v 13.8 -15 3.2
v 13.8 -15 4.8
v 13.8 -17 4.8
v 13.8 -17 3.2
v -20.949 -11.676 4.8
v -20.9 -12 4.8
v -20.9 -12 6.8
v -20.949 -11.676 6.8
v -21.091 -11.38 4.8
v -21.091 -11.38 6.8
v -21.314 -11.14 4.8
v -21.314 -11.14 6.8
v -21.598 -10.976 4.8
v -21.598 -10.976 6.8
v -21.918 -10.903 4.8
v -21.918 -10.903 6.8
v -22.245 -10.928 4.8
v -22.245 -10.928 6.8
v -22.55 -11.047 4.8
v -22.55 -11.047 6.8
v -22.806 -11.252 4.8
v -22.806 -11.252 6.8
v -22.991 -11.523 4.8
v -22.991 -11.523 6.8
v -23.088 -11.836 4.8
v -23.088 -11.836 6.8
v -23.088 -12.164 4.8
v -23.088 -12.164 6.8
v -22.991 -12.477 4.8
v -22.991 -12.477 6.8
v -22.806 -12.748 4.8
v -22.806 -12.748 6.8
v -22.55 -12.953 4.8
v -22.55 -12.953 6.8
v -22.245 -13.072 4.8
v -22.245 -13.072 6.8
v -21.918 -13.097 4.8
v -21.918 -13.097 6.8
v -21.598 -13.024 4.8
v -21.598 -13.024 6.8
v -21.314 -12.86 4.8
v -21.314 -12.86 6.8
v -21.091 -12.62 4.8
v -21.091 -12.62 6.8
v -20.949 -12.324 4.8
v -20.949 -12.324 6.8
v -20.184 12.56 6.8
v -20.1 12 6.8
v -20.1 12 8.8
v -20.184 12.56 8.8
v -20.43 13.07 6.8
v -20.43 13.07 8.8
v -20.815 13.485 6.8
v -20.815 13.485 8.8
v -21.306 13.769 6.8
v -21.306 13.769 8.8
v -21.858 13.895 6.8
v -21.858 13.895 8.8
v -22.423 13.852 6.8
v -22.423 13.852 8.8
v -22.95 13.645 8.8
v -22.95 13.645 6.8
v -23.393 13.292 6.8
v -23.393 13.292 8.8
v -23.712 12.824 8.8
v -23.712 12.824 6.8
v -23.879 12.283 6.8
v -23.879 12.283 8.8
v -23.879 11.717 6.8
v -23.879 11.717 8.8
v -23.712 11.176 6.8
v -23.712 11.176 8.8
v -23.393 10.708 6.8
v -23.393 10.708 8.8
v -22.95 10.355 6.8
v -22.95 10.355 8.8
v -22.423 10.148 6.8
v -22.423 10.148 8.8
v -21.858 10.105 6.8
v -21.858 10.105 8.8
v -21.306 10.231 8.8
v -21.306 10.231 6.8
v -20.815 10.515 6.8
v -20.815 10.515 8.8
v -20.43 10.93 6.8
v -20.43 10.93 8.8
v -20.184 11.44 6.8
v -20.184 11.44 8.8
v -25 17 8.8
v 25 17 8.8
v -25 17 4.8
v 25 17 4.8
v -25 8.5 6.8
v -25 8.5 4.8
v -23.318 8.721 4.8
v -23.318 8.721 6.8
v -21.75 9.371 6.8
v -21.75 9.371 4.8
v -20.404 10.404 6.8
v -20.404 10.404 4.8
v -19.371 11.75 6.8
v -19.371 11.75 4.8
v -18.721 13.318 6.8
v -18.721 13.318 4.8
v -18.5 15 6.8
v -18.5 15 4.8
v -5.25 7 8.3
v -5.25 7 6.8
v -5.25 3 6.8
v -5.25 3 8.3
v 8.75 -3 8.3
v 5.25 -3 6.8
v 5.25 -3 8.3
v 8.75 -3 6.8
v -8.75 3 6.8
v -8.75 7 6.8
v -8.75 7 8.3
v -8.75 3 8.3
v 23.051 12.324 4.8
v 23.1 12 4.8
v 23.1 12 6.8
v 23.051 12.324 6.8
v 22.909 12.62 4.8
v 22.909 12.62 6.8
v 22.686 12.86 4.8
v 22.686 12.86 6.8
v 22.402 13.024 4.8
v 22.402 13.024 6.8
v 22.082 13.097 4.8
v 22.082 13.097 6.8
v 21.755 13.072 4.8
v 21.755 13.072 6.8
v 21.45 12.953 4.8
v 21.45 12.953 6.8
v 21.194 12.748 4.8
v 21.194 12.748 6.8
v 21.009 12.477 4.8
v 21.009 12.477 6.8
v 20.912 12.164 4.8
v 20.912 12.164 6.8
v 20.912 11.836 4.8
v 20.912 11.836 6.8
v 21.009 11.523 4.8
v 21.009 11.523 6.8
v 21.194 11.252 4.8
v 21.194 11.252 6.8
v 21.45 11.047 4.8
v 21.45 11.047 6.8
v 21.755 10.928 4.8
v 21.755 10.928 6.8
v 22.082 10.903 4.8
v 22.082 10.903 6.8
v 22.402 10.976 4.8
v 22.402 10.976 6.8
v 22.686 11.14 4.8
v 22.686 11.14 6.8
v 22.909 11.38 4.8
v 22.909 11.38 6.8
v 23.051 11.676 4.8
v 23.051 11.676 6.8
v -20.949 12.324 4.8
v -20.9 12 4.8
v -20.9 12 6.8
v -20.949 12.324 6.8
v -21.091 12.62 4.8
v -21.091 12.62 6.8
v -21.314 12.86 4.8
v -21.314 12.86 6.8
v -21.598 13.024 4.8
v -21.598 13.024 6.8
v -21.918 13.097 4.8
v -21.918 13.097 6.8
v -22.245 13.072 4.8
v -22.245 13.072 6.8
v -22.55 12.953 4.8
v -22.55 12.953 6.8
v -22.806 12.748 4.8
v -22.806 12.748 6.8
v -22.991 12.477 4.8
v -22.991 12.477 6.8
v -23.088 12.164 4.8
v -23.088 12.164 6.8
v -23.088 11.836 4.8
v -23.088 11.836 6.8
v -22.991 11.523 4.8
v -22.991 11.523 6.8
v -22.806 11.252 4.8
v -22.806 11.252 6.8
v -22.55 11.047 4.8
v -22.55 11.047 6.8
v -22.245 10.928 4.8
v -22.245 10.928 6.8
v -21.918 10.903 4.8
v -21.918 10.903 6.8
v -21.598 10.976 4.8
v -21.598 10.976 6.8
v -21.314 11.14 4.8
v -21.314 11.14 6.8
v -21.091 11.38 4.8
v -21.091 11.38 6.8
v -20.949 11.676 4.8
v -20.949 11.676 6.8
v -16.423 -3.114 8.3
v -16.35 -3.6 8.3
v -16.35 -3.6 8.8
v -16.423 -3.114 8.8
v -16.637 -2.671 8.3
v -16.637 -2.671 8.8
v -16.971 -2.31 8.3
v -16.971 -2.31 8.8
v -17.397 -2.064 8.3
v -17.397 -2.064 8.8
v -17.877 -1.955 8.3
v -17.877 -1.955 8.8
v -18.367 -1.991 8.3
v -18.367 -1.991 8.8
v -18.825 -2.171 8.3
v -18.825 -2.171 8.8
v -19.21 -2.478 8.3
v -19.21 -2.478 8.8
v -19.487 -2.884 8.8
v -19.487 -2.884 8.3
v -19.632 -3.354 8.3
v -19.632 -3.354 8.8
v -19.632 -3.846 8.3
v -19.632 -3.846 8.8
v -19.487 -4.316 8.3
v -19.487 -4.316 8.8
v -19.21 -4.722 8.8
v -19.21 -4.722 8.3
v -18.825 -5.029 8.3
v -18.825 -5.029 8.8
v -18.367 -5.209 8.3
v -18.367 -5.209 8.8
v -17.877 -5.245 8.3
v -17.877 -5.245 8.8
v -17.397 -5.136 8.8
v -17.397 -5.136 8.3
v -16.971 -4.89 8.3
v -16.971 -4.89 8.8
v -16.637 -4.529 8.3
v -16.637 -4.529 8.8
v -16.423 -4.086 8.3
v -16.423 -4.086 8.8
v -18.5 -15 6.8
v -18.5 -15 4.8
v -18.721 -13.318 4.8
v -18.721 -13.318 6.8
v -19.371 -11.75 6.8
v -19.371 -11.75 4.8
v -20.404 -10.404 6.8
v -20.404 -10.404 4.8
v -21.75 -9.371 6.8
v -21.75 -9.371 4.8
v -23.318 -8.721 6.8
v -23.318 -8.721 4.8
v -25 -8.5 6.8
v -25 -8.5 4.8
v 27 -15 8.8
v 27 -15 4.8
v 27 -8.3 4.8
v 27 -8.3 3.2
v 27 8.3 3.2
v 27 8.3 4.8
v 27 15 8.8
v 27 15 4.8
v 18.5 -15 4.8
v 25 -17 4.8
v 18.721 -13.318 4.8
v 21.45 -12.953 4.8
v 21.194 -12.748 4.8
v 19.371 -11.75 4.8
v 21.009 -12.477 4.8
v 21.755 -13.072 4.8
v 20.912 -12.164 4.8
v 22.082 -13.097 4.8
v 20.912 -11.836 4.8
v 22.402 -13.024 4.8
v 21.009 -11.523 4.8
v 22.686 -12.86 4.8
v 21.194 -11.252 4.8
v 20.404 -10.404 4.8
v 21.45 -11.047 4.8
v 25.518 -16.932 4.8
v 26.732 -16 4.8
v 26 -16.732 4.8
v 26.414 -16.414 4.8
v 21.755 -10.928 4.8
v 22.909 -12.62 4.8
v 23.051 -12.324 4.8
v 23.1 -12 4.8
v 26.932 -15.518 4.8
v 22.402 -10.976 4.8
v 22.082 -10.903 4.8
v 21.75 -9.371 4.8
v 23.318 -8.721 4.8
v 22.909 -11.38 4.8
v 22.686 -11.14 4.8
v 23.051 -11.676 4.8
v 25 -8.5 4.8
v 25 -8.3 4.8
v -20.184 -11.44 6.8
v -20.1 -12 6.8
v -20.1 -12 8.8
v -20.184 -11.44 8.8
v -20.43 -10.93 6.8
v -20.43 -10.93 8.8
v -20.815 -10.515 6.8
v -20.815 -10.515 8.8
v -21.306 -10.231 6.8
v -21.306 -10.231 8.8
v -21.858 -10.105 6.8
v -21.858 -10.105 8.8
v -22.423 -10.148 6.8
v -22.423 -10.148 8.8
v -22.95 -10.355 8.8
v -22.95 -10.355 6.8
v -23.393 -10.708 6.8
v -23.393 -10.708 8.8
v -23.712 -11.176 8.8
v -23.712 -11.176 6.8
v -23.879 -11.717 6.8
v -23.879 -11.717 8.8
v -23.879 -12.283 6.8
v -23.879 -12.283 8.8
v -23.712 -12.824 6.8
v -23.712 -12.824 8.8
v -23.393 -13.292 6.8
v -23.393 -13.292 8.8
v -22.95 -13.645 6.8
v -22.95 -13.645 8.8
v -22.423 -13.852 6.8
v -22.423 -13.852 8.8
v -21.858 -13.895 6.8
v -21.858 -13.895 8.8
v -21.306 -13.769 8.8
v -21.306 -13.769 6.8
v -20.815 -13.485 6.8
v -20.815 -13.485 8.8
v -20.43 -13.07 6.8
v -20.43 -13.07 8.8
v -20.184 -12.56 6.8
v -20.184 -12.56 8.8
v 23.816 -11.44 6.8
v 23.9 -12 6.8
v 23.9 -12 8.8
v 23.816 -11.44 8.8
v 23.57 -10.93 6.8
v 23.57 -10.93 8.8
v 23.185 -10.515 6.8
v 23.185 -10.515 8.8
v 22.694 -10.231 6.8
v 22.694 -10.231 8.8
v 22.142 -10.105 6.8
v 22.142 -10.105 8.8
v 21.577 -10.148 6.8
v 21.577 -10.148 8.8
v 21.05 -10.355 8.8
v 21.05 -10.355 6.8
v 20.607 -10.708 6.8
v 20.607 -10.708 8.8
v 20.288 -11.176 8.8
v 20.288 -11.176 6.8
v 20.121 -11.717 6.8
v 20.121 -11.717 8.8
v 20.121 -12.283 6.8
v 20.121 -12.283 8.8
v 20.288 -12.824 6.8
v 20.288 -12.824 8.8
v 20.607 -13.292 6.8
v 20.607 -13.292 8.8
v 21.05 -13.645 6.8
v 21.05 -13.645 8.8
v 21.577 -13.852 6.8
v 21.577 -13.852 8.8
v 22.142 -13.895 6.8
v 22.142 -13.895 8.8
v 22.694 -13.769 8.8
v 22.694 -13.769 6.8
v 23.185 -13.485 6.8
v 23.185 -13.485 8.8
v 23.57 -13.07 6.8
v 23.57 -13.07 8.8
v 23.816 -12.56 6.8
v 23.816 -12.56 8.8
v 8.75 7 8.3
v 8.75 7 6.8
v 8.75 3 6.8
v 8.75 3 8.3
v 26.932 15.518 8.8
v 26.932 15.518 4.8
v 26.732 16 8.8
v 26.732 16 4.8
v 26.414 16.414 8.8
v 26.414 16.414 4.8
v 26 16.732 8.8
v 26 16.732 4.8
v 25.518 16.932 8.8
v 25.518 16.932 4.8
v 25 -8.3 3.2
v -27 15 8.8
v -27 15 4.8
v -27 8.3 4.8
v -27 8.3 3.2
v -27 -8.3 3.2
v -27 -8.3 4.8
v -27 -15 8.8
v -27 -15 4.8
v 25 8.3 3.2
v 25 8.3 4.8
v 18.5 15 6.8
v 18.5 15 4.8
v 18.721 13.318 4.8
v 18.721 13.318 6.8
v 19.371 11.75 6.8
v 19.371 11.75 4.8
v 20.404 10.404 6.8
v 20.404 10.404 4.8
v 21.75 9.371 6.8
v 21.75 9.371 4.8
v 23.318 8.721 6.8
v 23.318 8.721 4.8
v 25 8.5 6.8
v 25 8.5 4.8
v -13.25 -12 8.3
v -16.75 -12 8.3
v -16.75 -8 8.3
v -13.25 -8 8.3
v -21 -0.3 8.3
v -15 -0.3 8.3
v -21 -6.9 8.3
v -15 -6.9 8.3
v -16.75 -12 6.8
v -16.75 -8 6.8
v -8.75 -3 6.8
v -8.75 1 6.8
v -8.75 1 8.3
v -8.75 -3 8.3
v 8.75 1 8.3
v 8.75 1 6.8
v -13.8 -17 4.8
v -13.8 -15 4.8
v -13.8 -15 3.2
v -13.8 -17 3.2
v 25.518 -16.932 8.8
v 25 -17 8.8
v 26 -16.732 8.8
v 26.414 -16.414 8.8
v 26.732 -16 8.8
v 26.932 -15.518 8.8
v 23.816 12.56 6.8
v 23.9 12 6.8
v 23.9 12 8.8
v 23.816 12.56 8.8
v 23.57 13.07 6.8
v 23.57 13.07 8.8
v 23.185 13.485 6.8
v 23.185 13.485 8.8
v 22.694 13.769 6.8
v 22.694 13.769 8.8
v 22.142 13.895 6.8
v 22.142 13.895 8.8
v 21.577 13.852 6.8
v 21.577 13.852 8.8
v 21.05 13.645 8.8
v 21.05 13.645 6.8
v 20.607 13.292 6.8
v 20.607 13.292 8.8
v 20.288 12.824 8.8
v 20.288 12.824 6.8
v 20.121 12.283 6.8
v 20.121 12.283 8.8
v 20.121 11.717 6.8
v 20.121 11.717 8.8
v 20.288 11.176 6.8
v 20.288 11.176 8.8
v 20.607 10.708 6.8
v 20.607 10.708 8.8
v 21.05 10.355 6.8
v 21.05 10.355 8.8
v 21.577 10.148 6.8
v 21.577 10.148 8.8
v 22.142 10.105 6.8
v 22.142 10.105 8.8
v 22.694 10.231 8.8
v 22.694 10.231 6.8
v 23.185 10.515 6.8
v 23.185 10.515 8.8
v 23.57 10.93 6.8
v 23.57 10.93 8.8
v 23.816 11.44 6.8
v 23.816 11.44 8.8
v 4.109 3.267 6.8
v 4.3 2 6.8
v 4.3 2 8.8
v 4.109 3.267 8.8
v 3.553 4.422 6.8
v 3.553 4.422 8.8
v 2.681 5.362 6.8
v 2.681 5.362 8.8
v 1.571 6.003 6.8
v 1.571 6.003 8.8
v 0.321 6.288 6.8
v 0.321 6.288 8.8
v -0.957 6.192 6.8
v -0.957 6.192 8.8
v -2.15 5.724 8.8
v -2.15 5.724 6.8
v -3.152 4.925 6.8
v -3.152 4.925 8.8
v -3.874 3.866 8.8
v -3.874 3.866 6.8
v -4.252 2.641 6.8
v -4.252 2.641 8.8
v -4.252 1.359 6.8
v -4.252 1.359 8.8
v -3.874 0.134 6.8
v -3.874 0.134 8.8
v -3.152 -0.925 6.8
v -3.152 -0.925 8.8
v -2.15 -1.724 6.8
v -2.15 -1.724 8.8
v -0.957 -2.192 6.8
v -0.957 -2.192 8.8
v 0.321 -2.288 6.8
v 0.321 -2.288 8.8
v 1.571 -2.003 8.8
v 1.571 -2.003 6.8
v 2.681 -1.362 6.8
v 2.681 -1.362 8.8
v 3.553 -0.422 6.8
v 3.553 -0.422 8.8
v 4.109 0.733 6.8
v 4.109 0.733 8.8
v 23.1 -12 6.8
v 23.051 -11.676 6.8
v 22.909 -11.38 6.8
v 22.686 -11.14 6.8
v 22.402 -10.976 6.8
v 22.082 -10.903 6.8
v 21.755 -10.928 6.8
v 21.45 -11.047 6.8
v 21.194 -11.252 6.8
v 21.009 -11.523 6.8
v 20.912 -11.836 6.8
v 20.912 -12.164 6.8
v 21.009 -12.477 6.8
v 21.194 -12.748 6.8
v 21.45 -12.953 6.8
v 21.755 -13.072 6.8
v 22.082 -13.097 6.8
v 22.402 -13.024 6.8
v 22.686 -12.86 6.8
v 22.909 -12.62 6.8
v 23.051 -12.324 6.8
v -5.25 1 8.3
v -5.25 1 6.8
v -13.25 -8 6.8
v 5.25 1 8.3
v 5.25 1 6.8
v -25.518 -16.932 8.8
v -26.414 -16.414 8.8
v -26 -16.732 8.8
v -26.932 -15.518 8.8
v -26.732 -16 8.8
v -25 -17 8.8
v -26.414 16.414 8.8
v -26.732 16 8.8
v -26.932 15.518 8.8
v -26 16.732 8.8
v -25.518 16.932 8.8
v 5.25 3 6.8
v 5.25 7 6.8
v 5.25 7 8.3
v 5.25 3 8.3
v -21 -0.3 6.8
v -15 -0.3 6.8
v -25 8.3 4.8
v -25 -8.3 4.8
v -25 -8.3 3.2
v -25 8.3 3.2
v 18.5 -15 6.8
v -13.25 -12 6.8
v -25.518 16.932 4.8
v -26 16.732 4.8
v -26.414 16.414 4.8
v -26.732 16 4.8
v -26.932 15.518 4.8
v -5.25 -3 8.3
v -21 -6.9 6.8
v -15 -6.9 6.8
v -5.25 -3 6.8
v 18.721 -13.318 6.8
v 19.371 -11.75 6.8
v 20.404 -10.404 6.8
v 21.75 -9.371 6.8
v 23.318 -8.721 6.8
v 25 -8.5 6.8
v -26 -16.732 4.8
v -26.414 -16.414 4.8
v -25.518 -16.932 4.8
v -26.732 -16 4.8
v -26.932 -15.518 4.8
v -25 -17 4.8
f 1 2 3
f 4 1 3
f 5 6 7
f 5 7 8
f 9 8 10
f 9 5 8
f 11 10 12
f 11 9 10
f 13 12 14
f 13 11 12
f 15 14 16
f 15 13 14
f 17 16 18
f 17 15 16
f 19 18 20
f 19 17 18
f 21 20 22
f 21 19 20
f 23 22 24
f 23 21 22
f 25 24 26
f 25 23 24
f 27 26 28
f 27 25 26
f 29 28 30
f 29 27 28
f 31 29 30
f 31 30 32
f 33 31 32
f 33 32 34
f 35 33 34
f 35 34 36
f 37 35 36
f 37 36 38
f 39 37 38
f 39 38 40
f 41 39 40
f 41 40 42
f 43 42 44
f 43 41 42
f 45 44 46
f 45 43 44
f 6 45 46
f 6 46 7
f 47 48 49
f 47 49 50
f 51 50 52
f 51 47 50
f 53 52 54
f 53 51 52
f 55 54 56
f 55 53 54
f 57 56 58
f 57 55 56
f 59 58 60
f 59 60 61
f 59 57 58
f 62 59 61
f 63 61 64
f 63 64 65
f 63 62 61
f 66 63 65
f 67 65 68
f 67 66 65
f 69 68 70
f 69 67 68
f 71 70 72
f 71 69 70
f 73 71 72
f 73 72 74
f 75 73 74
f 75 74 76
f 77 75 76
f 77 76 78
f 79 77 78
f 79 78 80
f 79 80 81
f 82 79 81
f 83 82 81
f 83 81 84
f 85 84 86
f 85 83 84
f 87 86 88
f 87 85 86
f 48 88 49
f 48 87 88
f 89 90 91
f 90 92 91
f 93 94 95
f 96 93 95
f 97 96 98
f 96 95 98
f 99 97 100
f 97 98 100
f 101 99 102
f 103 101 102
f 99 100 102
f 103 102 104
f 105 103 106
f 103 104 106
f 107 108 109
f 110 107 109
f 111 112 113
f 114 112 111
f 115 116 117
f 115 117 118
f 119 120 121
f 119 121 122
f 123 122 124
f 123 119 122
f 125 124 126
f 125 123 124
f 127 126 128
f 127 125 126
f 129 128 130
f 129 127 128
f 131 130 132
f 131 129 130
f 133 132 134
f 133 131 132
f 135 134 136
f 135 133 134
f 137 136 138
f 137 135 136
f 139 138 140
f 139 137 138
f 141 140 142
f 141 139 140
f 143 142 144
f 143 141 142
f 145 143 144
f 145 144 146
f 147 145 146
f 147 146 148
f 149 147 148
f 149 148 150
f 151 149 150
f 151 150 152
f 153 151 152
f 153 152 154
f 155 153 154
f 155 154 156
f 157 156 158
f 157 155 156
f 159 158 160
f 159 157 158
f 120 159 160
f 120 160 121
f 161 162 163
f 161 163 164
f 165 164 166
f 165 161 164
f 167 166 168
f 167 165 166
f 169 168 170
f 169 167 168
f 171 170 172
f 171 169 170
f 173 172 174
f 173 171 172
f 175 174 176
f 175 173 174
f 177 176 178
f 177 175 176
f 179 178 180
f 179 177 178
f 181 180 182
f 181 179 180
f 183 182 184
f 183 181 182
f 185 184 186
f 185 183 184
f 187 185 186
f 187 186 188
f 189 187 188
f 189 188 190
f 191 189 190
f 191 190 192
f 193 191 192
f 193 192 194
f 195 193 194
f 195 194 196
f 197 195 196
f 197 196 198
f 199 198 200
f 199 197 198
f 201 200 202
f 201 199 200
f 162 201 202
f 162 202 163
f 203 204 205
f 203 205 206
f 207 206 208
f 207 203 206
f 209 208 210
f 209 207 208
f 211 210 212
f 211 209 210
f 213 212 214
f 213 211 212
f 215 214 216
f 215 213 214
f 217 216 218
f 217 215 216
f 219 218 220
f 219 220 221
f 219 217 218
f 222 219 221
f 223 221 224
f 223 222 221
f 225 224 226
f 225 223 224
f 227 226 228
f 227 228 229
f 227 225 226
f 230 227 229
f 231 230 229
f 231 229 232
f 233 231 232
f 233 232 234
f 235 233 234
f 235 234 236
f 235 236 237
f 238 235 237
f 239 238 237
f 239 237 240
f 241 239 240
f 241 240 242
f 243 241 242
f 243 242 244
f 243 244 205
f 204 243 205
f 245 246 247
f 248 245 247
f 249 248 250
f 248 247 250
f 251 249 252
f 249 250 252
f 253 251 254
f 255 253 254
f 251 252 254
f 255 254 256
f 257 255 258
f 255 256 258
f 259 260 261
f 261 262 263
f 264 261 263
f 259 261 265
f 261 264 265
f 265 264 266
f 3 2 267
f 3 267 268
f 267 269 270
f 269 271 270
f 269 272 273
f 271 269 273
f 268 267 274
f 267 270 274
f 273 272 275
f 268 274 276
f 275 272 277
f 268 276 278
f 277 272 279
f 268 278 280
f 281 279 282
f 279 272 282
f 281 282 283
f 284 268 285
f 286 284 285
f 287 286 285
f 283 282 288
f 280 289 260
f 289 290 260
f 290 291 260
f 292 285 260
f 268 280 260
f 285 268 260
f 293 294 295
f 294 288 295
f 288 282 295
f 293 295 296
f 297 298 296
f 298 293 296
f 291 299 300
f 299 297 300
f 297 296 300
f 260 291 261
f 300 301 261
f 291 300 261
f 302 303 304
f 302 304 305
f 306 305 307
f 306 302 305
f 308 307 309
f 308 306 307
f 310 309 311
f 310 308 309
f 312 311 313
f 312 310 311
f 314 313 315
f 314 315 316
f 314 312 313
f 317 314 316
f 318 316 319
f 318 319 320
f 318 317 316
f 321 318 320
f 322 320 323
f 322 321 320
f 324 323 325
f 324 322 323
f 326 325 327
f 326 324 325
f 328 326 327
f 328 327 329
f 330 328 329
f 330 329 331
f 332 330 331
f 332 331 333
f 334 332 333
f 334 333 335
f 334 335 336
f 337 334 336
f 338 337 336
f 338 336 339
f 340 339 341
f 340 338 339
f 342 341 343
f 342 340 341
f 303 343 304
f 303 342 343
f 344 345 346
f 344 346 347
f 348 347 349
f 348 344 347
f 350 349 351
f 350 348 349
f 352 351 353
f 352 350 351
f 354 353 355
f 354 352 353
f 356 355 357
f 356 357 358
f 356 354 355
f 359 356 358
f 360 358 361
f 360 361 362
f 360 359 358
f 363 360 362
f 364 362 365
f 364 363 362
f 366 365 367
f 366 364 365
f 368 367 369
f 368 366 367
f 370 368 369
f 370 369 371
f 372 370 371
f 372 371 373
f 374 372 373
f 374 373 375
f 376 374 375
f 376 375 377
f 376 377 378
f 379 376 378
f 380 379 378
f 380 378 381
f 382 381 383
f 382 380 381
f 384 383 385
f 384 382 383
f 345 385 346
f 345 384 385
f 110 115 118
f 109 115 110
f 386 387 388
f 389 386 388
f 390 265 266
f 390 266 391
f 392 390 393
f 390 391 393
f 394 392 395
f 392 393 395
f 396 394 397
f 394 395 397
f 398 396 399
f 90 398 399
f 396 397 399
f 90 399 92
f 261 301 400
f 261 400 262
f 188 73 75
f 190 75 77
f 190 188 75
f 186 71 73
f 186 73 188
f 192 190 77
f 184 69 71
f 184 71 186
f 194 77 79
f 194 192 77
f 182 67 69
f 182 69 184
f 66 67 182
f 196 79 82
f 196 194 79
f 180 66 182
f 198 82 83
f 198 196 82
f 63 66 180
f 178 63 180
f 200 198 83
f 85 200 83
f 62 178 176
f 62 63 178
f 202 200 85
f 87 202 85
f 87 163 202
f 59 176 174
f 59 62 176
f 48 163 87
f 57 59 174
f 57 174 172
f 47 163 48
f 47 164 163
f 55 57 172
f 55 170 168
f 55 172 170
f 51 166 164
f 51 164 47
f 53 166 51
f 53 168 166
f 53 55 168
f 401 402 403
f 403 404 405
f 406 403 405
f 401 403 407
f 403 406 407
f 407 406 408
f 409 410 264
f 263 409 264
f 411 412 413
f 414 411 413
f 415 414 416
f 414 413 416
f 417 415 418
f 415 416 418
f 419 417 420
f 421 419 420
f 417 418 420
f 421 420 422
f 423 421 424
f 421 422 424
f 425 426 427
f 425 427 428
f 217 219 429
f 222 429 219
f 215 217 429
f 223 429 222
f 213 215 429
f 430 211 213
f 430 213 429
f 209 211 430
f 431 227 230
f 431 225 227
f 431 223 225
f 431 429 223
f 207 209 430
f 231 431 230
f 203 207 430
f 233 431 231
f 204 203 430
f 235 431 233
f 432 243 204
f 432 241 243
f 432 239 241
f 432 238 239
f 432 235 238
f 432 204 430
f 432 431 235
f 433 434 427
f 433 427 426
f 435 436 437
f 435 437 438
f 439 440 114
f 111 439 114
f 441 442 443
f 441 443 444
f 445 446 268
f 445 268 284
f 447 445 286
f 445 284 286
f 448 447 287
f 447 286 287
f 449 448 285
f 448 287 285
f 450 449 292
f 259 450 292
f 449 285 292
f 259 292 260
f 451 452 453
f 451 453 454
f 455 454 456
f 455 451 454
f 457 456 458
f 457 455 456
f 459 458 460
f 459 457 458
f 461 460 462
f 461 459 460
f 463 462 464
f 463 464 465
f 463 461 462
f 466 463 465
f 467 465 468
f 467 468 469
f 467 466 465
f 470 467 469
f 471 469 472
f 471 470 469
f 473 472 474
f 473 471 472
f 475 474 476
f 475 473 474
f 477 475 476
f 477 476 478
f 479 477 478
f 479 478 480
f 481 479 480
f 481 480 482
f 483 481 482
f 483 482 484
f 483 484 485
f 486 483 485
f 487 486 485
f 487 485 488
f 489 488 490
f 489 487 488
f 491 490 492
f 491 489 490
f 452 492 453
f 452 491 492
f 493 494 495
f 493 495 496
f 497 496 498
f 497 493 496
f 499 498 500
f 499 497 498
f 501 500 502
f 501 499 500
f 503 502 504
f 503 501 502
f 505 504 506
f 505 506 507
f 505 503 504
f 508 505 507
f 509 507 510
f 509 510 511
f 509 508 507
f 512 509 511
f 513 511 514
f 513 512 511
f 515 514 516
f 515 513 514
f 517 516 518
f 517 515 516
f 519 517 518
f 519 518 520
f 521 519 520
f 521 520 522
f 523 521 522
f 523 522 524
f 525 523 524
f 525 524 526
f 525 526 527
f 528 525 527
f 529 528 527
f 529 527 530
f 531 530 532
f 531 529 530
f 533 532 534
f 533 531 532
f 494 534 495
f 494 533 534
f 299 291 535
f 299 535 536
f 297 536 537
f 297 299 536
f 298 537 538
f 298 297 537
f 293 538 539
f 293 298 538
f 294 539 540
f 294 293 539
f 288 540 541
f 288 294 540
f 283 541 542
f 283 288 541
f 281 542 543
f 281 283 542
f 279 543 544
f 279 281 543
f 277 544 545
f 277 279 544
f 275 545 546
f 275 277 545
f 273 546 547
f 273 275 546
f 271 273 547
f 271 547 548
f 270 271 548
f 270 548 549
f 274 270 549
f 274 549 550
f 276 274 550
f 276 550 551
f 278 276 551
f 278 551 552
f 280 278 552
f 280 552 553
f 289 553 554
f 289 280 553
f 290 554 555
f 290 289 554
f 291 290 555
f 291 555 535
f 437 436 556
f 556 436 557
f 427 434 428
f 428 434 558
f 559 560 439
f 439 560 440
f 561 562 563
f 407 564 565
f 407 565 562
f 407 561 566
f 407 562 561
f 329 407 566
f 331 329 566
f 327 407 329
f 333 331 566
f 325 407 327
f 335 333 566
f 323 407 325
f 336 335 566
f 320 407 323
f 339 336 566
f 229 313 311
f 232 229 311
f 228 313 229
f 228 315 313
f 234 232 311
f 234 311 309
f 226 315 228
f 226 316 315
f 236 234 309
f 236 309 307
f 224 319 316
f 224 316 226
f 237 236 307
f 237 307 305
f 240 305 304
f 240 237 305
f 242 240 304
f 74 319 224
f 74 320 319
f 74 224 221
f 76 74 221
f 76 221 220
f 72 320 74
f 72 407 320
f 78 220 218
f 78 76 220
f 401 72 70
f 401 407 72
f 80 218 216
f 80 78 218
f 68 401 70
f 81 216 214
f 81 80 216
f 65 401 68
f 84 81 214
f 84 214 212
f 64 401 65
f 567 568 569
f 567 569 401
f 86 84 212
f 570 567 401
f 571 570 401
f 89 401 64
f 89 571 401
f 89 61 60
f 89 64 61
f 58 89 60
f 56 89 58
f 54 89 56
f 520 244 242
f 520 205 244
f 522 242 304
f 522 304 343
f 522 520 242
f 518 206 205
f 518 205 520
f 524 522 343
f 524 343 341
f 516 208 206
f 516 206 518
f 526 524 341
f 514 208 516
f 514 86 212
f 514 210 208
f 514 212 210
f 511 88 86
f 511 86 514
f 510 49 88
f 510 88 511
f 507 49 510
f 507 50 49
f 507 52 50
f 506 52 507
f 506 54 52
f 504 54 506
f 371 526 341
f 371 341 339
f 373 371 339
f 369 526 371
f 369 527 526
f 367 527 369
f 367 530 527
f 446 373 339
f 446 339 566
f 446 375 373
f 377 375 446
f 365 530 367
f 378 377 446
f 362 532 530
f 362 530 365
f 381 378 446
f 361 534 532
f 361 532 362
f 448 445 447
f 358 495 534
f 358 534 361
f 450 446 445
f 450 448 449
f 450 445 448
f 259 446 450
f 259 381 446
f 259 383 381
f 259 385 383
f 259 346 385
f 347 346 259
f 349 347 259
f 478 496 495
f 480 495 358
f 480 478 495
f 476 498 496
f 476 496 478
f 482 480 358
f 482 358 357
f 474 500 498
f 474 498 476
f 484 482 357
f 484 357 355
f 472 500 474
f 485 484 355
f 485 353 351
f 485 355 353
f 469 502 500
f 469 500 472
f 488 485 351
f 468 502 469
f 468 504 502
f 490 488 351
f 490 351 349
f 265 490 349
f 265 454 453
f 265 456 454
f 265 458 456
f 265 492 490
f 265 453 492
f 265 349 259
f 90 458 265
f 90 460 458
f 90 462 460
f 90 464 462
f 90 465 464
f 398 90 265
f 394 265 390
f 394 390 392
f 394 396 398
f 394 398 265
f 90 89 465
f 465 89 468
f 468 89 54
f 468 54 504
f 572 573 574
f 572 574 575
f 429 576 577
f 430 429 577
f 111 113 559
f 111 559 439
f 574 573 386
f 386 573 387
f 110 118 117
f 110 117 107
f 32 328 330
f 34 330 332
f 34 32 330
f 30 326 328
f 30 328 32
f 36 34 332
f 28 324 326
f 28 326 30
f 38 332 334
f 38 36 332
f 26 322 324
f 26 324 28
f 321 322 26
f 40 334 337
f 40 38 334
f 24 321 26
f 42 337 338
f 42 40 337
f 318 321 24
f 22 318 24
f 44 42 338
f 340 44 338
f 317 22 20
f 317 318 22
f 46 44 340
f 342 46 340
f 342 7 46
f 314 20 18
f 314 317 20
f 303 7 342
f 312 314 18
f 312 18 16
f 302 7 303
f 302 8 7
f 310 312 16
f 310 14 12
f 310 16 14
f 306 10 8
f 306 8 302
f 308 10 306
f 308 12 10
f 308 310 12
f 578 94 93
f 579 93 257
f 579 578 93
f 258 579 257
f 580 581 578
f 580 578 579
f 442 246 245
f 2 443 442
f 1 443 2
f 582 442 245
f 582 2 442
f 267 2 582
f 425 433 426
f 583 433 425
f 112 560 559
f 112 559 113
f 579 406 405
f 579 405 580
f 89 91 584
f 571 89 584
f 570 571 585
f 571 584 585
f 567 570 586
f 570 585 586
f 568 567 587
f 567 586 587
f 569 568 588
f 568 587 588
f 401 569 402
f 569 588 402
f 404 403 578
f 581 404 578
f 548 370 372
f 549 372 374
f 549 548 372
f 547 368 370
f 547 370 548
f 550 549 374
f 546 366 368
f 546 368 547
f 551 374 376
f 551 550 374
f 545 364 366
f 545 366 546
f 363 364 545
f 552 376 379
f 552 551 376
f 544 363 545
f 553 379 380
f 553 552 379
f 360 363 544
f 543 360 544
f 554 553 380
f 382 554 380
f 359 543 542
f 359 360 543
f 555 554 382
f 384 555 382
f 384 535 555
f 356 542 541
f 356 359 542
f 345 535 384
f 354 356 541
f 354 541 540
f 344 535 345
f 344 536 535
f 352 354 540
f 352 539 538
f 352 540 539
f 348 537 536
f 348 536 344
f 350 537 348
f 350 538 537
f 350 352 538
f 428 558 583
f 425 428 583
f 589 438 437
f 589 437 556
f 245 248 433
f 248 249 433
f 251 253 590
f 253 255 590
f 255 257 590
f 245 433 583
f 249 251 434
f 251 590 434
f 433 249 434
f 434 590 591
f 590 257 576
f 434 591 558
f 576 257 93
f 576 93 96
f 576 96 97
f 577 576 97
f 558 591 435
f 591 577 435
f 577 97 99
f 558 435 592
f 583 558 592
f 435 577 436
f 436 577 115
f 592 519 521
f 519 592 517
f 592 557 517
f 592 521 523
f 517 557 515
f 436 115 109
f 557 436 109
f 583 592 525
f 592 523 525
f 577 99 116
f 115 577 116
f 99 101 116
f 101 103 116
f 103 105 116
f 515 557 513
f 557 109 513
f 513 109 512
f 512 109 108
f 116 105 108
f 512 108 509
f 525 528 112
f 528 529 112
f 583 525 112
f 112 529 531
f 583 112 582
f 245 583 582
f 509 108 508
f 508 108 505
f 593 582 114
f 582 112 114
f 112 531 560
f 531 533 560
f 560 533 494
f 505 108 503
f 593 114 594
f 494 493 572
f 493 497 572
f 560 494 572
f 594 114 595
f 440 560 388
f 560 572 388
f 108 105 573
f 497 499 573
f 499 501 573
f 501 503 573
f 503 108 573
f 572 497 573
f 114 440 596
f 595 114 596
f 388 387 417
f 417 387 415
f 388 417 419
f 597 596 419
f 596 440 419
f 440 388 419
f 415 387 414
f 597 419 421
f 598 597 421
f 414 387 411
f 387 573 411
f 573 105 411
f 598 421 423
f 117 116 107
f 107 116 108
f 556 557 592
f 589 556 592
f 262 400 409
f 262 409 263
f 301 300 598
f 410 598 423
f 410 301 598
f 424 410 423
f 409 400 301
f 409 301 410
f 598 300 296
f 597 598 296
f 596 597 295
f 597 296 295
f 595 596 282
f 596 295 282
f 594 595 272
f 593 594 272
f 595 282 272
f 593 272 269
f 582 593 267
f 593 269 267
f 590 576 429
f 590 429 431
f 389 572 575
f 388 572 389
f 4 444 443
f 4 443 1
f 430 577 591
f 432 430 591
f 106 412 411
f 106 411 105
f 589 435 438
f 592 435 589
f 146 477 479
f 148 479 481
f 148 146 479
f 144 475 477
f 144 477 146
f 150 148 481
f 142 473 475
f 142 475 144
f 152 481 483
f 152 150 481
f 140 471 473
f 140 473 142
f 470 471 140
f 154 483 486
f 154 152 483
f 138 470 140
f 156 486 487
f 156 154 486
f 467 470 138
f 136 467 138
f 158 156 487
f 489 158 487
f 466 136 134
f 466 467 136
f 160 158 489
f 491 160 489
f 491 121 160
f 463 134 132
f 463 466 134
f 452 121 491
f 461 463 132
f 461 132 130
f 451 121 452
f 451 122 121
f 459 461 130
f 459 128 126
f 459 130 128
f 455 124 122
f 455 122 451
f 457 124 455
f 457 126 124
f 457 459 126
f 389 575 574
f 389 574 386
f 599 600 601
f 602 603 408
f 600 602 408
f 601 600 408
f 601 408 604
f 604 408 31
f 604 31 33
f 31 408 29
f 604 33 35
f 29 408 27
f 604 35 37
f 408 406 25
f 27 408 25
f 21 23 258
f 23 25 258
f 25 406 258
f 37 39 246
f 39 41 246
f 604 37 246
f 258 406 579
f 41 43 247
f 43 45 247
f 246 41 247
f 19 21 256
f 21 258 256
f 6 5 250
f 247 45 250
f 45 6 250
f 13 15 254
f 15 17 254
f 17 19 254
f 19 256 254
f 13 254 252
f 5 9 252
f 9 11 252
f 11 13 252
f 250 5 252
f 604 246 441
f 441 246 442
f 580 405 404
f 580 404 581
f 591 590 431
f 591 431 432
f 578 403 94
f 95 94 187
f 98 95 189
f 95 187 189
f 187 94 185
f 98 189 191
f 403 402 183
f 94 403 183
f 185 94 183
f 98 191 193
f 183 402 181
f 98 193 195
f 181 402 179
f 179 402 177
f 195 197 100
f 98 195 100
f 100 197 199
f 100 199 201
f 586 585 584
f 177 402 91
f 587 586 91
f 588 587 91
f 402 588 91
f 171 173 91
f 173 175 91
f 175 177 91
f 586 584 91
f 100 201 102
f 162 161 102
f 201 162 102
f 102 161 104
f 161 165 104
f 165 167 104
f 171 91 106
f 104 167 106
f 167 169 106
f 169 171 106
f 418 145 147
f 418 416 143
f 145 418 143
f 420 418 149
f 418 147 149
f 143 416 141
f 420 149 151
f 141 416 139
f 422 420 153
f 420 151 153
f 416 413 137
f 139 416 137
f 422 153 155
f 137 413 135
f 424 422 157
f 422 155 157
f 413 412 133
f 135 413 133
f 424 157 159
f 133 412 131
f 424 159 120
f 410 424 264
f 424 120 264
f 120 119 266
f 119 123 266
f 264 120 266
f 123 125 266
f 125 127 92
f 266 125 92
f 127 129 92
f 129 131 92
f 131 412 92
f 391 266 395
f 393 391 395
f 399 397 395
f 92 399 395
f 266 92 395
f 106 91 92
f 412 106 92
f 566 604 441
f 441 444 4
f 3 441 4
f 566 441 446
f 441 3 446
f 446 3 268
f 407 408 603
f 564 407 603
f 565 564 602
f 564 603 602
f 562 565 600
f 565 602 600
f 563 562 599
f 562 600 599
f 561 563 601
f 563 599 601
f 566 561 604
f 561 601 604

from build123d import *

# Parameters (mm, degrees)
SKETCH010_R     = 1.1
PAD006_DEPTH    = 2
SKETCH011_W     = 2
SKETCH011_H     = 16.6
SKETCH011_W_2   = 27.6
SKETCH011_H_2   = 2
PAD007_DEPTH    = 1.6
SKETCH012_R     = 1.9
SKETCH012_R_2   = 4.3
SKETCH012_R_3   = 1.65
PAD008_DEPTH    = 2
SKETCH013_W     = 6
SKETCH013_H     = 6.6
SKETCH013_W_2   = 3.5
SKETCH013_H_2   = 4
POCKET002_DEPTH = 1.5


with BuildPart() as part:
    # Sketch010 → Pad006 (new body)
    with BuildSketch(Plane.XY.offset(4.8)):
        with BuildLine():
            Line((-25, -17), (25, -17))
            ThreePointArc((25, -17), (26.414214, -16.414214), (27, -15))
            Line((27, -15), (27, 15))
            ThreePointArc((27, 15), (26.414214, 16.414214), (25, 17))
            Line((25, 17), (-25, 17))
            ThreePointArc((-25, 17), (-26.414214, 16.414214), (-27, 15))
            Line((-27, 15), (-27, -15))
            ThreePointArc((-27, -15), (-26.414214, -16.414214), (-25, -17))
        make_face()
        with Locations((-22, 12)):
            Circle(SKETCH010_R, mode=Mode.SUBTRACT)
        with Locations((22, 12)):
            Circle(SKETCH010_R, mode=Mode.SUBTRACT)
        with Locations((-22, -12)):
            Circle(SKETCH010_R, mode=Mode.SUBTRACT)
        with Locations((22, -12)):
            Circle(SKETCH010_R, mode=Mode.SUBTRACT)
        with BuildLine():
            Line((-18.5, -15), (18.5, -15))
            ThreePointArc((25, -8.5), (20.403806, -10.403806), (18.5, -15))
            Line((25, -8.5), (25, 8.5))
            ThreePointArc((18.5, 15), (20.403806, 10.403806), (25, 8.5))
            Line((18.5, 15), (-18.5, 15))
            ThreePointArc((-25, 8.5), (-20.403806, 10.403806), (-18.5, 15))
            Line((-25, 8.5), (-25, -8.5))
            ThreePointArc((-18.5, -15), (-20.403806, -10.403806), (-25, -8.5))
        make_face(mode=Mode.SUBTRACT)
    extrude(amount=PAD006_DEPTH)

    # Sketch011 (on Face21 of Pad006) → Pad007 (join)
    with BuildSketch(Plane(origin=(0, 0, 4.8), x_dir=(1, 0, 0), z_dir=(0, 0, -1))):
        with Locations((-26, 0)):
            Rectangle(SKETCH011_W, SKETCH011_H)
        with Locations((26, 0)):
            Rectangle(SKETCH011_W, SKETCH011_H)
        with Locations((0, 16)):
            Rectangle(SKETCH011_W_2, SKETCH011_H_2)
    extrude(amount=PAD007_DEPTH)

    # Sketch012 (on Face3 of Pad007) → Pad008 (join)
    with BuildSketch(Plane.XY.offset(6.8)):
        with BuildLine():
            Line((-25, -17), (25, -17))
            ThreePointArc((25, -17), (26.414214, -16.414214), (27, -15))
            Line((27, -15), (27, 15))
            ThreePointArc((27, 15), (26.414214, 16.414214), (25, 17))
            Line((25, 17), (-25, 17))
            ThreePointArc((-25, 17), (-26.414214, 16.414214), (-27, 15))
            Line((-27, 15), (-27, -15))
            ThreePointArc((-27, -15), (-26.414214, -16.414214), (-25, -17))
        make_face()
        with Locations((-22, 12)):
            Circle(SKETCH012_R, mode=Mode.SUBTRACT)
        with Locations((22, 12)):
            Circle(SKETCH012_R, mode=Mode.SUBTRACT)
        with Locations((-22, -12)):
            Circle(SKETCH012_R, mode=Mode.SUBTRACT)
        with Locations((22, -12)):
            Circle(SKETCH012_R, mode=Mode.SUBTRACT)
        with Locations((0, 2)):
            Circle(SKETCH012_R_2, mode=Mode.SUBTRACT)
        with Locations((-18, -3.6)):
            Circle(SKETCH012_R_3, mode=Mode.SUBTRACT)
    extrude(amount=PAD008_DEPTH)

    # Sketch013 (on Face24 of Pad008) → Pocket002 (cut)
    with BuildSketch(Plane(origin=(0, 0, 6.8), x_dir=(1, 0, 0), z_dir=(0, 0, -1))):
        with Locations((-18, 3.6)):
            Rectangle(SKETCH013_W, SKETCH013_H)
        with Locations((-7, -5)):
            Rectangle(SKETCH013_W_2, SKETCH013_H_2)
        with Locations((-7, 1)):
            Rectangle(SKETCH013_W_2, SKETCH013_H_2)
        with Locations((7, -5)):
            Rectangle(SKETCH013_W_2, SKETCH013_H_2)
        with Locations((7, 1)):
            Rectangle(SKETCH013_W_2, SKETCH013_H_2)
        with Locations((-15, 10)):
            Rectangle(SKETCH013_W_2, SKETCH013_H_2)
    extrude(amount=-POCKET002_DEPTH, mode=Mode.SUBTRACT)


solid = part.part
